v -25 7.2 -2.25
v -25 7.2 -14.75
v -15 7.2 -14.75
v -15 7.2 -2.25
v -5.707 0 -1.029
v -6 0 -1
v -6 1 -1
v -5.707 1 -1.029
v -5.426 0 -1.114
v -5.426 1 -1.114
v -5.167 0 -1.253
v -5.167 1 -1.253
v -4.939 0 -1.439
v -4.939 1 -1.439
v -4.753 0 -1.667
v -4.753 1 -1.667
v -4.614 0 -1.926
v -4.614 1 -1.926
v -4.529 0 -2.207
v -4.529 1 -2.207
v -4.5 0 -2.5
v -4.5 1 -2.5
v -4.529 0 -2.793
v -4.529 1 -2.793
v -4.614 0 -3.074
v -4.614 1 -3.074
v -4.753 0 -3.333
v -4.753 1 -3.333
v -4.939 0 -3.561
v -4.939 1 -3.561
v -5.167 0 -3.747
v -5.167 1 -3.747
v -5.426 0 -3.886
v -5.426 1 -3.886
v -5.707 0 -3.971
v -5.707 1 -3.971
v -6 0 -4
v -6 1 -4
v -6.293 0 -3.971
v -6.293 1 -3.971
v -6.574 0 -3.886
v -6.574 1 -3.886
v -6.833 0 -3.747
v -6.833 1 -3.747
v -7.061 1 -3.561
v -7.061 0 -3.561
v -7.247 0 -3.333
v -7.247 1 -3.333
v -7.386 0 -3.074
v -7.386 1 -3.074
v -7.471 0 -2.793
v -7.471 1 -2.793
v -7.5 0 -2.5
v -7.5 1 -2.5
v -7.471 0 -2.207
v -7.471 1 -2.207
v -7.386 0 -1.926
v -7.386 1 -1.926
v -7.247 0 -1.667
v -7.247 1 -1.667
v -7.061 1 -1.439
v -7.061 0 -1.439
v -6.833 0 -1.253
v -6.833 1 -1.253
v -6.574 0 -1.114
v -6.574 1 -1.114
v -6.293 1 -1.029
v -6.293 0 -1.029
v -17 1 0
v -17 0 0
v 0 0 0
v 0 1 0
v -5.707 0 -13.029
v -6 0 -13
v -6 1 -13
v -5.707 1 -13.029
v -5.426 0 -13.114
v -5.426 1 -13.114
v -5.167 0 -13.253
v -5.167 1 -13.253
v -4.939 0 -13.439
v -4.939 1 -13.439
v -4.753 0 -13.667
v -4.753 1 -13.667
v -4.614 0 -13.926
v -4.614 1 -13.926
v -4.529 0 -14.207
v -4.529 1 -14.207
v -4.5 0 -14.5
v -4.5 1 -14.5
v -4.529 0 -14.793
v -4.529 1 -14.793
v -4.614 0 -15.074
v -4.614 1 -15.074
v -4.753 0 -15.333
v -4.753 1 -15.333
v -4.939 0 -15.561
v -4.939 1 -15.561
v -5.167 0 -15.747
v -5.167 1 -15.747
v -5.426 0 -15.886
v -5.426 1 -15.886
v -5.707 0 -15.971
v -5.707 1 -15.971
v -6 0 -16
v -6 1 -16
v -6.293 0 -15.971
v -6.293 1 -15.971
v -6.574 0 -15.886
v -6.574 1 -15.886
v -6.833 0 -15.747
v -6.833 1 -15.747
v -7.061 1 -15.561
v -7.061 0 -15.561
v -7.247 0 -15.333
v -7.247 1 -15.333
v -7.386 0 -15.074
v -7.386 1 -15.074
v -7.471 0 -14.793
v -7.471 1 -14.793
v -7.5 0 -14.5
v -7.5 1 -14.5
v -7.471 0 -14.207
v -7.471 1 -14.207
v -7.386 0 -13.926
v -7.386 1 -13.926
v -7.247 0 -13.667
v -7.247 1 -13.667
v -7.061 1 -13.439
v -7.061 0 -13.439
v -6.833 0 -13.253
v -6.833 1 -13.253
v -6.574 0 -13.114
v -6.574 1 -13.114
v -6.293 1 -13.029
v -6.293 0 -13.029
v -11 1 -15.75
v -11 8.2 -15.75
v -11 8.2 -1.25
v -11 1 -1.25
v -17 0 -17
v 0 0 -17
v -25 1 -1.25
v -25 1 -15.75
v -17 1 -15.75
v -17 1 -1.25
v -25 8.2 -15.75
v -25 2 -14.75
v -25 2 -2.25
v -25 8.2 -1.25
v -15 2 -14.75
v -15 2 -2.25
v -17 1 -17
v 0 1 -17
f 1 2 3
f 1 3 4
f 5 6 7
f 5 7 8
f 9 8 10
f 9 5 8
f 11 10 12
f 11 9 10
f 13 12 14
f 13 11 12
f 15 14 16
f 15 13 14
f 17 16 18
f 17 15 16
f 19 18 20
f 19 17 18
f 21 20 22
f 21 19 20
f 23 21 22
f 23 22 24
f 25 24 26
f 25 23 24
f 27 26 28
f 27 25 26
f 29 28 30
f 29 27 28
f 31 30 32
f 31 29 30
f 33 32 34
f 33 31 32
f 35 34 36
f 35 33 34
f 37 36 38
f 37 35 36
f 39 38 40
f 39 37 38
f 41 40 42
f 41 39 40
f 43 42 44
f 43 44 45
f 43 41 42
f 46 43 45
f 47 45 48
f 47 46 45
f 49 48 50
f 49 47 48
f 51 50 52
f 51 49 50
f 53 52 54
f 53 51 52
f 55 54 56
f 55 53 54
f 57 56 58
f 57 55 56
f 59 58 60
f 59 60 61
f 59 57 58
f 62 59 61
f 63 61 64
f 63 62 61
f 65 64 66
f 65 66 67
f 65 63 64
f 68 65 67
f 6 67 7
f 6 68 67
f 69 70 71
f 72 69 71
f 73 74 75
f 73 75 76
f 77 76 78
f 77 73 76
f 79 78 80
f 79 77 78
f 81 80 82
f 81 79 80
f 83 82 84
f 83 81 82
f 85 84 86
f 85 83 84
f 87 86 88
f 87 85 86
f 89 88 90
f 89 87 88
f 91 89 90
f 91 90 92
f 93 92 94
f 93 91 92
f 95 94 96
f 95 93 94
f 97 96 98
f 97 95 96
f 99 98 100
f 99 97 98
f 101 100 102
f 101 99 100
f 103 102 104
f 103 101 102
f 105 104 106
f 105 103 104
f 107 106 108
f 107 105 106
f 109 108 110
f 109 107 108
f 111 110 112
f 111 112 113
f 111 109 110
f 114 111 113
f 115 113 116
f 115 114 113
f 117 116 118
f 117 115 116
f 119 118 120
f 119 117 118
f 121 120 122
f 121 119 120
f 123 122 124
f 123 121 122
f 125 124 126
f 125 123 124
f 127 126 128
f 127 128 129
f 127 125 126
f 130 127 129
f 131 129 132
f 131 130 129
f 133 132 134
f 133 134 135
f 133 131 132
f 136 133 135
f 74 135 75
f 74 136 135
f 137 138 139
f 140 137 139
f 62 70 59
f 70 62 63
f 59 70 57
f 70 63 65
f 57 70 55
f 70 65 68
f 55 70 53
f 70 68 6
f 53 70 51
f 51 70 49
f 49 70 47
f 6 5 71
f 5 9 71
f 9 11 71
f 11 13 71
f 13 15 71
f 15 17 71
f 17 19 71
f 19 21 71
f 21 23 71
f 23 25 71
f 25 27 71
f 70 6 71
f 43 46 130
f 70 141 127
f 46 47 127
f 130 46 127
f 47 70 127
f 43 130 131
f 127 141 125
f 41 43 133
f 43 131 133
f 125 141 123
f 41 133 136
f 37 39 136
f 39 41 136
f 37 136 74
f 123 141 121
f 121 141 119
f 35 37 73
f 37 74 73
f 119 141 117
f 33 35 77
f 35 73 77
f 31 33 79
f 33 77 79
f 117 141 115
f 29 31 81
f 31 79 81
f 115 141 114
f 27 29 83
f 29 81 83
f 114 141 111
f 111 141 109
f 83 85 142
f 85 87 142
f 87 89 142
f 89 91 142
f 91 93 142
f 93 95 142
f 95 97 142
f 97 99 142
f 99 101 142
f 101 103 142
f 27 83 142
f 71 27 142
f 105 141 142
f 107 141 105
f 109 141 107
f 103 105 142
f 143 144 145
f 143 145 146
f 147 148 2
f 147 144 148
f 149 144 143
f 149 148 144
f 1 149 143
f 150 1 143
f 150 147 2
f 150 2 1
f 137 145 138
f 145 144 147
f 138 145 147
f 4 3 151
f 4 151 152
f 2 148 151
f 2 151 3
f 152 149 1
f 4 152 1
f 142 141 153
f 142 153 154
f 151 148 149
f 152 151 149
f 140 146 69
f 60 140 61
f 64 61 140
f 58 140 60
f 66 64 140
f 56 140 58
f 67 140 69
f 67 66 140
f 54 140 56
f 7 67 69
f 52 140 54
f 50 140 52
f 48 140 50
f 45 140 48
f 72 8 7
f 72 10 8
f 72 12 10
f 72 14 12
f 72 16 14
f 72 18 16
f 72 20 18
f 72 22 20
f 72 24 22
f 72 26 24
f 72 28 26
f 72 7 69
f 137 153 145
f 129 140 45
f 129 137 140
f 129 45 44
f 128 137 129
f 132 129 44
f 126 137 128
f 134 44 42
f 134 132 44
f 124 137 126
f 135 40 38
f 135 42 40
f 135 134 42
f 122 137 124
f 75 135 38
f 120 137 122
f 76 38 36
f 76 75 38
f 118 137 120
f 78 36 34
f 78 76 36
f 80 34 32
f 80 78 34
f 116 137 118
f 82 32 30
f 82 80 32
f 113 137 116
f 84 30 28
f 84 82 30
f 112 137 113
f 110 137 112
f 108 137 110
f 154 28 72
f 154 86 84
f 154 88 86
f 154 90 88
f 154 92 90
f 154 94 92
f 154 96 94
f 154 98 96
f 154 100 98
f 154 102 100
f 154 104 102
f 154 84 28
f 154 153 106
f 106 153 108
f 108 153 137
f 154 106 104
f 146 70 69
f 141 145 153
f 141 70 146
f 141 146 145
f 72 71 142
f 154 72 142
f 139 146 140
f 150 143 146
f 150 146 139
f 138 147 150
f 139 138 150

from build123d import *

# Parameters (mm, degrees)
SKETCH1_W           = 17
SKETCH1_H           = 17
SKETCH1_R           = 1.5
BOSS_EXTRUDE1_DEPTH = 1
SKETCH2_W           = 14.5
SKETCH2_H           = 7.2
BOSS_EXTRUDE2_DEPTH = 14
SKETCH3_W           = 12.5
SKETCH3_H           = 5.2
CUT_EXTRUDE1_DEPTH  = 10


with BuildPart() as part:
    # Sketch1 → Boss-Extrude1 (new body)
    with BuildSketch(Plane(origin=(0, 0, 0), x_dir=(1, 0, 0), z_dir=(0, 1, 0))):
        with Locations((-8.5, 8.5)):
            Rectangle(SKETCH1_W, SKETCH1_H)
        with Locations(Location((-6, 14.5, 0), (0, 0, 270))):
            Circle(SKETCH1_R, mode=Mode.SUBTRACT)
        with Locations(Location((-6, 2.5, 0), (0, 0, 270))):
            Circle(SKETCH1_R, mode=Mode.SUBTRACT)
    extrude(amount=BOSS_EXTRUDE1_DEPTH)

    # Sketch2 → Boss-Extrude2 (add)
    with BuildSketch(Plane.ZY.offset(25)):
        with Locations((-8.5, 4.6)):
            Rectangle(SKETCH2_W, SKETCH2_H)
    extrude(amount=-BOSS_EXTRUDE2_DEPTH)

    # Sketch3 → Cut-Extrude1 (cut)
    with BuildSketch(Plane.ZY.offset(25)):
        with Locations((-8.5, 4.6)):
            Rectangle(SKETCH3_W, SKETCH3_H)
    extrude(amount=-CUT_EXTRUDE1_DEPTH, mode=Mode.SUBTRACT)


solid = part.part
